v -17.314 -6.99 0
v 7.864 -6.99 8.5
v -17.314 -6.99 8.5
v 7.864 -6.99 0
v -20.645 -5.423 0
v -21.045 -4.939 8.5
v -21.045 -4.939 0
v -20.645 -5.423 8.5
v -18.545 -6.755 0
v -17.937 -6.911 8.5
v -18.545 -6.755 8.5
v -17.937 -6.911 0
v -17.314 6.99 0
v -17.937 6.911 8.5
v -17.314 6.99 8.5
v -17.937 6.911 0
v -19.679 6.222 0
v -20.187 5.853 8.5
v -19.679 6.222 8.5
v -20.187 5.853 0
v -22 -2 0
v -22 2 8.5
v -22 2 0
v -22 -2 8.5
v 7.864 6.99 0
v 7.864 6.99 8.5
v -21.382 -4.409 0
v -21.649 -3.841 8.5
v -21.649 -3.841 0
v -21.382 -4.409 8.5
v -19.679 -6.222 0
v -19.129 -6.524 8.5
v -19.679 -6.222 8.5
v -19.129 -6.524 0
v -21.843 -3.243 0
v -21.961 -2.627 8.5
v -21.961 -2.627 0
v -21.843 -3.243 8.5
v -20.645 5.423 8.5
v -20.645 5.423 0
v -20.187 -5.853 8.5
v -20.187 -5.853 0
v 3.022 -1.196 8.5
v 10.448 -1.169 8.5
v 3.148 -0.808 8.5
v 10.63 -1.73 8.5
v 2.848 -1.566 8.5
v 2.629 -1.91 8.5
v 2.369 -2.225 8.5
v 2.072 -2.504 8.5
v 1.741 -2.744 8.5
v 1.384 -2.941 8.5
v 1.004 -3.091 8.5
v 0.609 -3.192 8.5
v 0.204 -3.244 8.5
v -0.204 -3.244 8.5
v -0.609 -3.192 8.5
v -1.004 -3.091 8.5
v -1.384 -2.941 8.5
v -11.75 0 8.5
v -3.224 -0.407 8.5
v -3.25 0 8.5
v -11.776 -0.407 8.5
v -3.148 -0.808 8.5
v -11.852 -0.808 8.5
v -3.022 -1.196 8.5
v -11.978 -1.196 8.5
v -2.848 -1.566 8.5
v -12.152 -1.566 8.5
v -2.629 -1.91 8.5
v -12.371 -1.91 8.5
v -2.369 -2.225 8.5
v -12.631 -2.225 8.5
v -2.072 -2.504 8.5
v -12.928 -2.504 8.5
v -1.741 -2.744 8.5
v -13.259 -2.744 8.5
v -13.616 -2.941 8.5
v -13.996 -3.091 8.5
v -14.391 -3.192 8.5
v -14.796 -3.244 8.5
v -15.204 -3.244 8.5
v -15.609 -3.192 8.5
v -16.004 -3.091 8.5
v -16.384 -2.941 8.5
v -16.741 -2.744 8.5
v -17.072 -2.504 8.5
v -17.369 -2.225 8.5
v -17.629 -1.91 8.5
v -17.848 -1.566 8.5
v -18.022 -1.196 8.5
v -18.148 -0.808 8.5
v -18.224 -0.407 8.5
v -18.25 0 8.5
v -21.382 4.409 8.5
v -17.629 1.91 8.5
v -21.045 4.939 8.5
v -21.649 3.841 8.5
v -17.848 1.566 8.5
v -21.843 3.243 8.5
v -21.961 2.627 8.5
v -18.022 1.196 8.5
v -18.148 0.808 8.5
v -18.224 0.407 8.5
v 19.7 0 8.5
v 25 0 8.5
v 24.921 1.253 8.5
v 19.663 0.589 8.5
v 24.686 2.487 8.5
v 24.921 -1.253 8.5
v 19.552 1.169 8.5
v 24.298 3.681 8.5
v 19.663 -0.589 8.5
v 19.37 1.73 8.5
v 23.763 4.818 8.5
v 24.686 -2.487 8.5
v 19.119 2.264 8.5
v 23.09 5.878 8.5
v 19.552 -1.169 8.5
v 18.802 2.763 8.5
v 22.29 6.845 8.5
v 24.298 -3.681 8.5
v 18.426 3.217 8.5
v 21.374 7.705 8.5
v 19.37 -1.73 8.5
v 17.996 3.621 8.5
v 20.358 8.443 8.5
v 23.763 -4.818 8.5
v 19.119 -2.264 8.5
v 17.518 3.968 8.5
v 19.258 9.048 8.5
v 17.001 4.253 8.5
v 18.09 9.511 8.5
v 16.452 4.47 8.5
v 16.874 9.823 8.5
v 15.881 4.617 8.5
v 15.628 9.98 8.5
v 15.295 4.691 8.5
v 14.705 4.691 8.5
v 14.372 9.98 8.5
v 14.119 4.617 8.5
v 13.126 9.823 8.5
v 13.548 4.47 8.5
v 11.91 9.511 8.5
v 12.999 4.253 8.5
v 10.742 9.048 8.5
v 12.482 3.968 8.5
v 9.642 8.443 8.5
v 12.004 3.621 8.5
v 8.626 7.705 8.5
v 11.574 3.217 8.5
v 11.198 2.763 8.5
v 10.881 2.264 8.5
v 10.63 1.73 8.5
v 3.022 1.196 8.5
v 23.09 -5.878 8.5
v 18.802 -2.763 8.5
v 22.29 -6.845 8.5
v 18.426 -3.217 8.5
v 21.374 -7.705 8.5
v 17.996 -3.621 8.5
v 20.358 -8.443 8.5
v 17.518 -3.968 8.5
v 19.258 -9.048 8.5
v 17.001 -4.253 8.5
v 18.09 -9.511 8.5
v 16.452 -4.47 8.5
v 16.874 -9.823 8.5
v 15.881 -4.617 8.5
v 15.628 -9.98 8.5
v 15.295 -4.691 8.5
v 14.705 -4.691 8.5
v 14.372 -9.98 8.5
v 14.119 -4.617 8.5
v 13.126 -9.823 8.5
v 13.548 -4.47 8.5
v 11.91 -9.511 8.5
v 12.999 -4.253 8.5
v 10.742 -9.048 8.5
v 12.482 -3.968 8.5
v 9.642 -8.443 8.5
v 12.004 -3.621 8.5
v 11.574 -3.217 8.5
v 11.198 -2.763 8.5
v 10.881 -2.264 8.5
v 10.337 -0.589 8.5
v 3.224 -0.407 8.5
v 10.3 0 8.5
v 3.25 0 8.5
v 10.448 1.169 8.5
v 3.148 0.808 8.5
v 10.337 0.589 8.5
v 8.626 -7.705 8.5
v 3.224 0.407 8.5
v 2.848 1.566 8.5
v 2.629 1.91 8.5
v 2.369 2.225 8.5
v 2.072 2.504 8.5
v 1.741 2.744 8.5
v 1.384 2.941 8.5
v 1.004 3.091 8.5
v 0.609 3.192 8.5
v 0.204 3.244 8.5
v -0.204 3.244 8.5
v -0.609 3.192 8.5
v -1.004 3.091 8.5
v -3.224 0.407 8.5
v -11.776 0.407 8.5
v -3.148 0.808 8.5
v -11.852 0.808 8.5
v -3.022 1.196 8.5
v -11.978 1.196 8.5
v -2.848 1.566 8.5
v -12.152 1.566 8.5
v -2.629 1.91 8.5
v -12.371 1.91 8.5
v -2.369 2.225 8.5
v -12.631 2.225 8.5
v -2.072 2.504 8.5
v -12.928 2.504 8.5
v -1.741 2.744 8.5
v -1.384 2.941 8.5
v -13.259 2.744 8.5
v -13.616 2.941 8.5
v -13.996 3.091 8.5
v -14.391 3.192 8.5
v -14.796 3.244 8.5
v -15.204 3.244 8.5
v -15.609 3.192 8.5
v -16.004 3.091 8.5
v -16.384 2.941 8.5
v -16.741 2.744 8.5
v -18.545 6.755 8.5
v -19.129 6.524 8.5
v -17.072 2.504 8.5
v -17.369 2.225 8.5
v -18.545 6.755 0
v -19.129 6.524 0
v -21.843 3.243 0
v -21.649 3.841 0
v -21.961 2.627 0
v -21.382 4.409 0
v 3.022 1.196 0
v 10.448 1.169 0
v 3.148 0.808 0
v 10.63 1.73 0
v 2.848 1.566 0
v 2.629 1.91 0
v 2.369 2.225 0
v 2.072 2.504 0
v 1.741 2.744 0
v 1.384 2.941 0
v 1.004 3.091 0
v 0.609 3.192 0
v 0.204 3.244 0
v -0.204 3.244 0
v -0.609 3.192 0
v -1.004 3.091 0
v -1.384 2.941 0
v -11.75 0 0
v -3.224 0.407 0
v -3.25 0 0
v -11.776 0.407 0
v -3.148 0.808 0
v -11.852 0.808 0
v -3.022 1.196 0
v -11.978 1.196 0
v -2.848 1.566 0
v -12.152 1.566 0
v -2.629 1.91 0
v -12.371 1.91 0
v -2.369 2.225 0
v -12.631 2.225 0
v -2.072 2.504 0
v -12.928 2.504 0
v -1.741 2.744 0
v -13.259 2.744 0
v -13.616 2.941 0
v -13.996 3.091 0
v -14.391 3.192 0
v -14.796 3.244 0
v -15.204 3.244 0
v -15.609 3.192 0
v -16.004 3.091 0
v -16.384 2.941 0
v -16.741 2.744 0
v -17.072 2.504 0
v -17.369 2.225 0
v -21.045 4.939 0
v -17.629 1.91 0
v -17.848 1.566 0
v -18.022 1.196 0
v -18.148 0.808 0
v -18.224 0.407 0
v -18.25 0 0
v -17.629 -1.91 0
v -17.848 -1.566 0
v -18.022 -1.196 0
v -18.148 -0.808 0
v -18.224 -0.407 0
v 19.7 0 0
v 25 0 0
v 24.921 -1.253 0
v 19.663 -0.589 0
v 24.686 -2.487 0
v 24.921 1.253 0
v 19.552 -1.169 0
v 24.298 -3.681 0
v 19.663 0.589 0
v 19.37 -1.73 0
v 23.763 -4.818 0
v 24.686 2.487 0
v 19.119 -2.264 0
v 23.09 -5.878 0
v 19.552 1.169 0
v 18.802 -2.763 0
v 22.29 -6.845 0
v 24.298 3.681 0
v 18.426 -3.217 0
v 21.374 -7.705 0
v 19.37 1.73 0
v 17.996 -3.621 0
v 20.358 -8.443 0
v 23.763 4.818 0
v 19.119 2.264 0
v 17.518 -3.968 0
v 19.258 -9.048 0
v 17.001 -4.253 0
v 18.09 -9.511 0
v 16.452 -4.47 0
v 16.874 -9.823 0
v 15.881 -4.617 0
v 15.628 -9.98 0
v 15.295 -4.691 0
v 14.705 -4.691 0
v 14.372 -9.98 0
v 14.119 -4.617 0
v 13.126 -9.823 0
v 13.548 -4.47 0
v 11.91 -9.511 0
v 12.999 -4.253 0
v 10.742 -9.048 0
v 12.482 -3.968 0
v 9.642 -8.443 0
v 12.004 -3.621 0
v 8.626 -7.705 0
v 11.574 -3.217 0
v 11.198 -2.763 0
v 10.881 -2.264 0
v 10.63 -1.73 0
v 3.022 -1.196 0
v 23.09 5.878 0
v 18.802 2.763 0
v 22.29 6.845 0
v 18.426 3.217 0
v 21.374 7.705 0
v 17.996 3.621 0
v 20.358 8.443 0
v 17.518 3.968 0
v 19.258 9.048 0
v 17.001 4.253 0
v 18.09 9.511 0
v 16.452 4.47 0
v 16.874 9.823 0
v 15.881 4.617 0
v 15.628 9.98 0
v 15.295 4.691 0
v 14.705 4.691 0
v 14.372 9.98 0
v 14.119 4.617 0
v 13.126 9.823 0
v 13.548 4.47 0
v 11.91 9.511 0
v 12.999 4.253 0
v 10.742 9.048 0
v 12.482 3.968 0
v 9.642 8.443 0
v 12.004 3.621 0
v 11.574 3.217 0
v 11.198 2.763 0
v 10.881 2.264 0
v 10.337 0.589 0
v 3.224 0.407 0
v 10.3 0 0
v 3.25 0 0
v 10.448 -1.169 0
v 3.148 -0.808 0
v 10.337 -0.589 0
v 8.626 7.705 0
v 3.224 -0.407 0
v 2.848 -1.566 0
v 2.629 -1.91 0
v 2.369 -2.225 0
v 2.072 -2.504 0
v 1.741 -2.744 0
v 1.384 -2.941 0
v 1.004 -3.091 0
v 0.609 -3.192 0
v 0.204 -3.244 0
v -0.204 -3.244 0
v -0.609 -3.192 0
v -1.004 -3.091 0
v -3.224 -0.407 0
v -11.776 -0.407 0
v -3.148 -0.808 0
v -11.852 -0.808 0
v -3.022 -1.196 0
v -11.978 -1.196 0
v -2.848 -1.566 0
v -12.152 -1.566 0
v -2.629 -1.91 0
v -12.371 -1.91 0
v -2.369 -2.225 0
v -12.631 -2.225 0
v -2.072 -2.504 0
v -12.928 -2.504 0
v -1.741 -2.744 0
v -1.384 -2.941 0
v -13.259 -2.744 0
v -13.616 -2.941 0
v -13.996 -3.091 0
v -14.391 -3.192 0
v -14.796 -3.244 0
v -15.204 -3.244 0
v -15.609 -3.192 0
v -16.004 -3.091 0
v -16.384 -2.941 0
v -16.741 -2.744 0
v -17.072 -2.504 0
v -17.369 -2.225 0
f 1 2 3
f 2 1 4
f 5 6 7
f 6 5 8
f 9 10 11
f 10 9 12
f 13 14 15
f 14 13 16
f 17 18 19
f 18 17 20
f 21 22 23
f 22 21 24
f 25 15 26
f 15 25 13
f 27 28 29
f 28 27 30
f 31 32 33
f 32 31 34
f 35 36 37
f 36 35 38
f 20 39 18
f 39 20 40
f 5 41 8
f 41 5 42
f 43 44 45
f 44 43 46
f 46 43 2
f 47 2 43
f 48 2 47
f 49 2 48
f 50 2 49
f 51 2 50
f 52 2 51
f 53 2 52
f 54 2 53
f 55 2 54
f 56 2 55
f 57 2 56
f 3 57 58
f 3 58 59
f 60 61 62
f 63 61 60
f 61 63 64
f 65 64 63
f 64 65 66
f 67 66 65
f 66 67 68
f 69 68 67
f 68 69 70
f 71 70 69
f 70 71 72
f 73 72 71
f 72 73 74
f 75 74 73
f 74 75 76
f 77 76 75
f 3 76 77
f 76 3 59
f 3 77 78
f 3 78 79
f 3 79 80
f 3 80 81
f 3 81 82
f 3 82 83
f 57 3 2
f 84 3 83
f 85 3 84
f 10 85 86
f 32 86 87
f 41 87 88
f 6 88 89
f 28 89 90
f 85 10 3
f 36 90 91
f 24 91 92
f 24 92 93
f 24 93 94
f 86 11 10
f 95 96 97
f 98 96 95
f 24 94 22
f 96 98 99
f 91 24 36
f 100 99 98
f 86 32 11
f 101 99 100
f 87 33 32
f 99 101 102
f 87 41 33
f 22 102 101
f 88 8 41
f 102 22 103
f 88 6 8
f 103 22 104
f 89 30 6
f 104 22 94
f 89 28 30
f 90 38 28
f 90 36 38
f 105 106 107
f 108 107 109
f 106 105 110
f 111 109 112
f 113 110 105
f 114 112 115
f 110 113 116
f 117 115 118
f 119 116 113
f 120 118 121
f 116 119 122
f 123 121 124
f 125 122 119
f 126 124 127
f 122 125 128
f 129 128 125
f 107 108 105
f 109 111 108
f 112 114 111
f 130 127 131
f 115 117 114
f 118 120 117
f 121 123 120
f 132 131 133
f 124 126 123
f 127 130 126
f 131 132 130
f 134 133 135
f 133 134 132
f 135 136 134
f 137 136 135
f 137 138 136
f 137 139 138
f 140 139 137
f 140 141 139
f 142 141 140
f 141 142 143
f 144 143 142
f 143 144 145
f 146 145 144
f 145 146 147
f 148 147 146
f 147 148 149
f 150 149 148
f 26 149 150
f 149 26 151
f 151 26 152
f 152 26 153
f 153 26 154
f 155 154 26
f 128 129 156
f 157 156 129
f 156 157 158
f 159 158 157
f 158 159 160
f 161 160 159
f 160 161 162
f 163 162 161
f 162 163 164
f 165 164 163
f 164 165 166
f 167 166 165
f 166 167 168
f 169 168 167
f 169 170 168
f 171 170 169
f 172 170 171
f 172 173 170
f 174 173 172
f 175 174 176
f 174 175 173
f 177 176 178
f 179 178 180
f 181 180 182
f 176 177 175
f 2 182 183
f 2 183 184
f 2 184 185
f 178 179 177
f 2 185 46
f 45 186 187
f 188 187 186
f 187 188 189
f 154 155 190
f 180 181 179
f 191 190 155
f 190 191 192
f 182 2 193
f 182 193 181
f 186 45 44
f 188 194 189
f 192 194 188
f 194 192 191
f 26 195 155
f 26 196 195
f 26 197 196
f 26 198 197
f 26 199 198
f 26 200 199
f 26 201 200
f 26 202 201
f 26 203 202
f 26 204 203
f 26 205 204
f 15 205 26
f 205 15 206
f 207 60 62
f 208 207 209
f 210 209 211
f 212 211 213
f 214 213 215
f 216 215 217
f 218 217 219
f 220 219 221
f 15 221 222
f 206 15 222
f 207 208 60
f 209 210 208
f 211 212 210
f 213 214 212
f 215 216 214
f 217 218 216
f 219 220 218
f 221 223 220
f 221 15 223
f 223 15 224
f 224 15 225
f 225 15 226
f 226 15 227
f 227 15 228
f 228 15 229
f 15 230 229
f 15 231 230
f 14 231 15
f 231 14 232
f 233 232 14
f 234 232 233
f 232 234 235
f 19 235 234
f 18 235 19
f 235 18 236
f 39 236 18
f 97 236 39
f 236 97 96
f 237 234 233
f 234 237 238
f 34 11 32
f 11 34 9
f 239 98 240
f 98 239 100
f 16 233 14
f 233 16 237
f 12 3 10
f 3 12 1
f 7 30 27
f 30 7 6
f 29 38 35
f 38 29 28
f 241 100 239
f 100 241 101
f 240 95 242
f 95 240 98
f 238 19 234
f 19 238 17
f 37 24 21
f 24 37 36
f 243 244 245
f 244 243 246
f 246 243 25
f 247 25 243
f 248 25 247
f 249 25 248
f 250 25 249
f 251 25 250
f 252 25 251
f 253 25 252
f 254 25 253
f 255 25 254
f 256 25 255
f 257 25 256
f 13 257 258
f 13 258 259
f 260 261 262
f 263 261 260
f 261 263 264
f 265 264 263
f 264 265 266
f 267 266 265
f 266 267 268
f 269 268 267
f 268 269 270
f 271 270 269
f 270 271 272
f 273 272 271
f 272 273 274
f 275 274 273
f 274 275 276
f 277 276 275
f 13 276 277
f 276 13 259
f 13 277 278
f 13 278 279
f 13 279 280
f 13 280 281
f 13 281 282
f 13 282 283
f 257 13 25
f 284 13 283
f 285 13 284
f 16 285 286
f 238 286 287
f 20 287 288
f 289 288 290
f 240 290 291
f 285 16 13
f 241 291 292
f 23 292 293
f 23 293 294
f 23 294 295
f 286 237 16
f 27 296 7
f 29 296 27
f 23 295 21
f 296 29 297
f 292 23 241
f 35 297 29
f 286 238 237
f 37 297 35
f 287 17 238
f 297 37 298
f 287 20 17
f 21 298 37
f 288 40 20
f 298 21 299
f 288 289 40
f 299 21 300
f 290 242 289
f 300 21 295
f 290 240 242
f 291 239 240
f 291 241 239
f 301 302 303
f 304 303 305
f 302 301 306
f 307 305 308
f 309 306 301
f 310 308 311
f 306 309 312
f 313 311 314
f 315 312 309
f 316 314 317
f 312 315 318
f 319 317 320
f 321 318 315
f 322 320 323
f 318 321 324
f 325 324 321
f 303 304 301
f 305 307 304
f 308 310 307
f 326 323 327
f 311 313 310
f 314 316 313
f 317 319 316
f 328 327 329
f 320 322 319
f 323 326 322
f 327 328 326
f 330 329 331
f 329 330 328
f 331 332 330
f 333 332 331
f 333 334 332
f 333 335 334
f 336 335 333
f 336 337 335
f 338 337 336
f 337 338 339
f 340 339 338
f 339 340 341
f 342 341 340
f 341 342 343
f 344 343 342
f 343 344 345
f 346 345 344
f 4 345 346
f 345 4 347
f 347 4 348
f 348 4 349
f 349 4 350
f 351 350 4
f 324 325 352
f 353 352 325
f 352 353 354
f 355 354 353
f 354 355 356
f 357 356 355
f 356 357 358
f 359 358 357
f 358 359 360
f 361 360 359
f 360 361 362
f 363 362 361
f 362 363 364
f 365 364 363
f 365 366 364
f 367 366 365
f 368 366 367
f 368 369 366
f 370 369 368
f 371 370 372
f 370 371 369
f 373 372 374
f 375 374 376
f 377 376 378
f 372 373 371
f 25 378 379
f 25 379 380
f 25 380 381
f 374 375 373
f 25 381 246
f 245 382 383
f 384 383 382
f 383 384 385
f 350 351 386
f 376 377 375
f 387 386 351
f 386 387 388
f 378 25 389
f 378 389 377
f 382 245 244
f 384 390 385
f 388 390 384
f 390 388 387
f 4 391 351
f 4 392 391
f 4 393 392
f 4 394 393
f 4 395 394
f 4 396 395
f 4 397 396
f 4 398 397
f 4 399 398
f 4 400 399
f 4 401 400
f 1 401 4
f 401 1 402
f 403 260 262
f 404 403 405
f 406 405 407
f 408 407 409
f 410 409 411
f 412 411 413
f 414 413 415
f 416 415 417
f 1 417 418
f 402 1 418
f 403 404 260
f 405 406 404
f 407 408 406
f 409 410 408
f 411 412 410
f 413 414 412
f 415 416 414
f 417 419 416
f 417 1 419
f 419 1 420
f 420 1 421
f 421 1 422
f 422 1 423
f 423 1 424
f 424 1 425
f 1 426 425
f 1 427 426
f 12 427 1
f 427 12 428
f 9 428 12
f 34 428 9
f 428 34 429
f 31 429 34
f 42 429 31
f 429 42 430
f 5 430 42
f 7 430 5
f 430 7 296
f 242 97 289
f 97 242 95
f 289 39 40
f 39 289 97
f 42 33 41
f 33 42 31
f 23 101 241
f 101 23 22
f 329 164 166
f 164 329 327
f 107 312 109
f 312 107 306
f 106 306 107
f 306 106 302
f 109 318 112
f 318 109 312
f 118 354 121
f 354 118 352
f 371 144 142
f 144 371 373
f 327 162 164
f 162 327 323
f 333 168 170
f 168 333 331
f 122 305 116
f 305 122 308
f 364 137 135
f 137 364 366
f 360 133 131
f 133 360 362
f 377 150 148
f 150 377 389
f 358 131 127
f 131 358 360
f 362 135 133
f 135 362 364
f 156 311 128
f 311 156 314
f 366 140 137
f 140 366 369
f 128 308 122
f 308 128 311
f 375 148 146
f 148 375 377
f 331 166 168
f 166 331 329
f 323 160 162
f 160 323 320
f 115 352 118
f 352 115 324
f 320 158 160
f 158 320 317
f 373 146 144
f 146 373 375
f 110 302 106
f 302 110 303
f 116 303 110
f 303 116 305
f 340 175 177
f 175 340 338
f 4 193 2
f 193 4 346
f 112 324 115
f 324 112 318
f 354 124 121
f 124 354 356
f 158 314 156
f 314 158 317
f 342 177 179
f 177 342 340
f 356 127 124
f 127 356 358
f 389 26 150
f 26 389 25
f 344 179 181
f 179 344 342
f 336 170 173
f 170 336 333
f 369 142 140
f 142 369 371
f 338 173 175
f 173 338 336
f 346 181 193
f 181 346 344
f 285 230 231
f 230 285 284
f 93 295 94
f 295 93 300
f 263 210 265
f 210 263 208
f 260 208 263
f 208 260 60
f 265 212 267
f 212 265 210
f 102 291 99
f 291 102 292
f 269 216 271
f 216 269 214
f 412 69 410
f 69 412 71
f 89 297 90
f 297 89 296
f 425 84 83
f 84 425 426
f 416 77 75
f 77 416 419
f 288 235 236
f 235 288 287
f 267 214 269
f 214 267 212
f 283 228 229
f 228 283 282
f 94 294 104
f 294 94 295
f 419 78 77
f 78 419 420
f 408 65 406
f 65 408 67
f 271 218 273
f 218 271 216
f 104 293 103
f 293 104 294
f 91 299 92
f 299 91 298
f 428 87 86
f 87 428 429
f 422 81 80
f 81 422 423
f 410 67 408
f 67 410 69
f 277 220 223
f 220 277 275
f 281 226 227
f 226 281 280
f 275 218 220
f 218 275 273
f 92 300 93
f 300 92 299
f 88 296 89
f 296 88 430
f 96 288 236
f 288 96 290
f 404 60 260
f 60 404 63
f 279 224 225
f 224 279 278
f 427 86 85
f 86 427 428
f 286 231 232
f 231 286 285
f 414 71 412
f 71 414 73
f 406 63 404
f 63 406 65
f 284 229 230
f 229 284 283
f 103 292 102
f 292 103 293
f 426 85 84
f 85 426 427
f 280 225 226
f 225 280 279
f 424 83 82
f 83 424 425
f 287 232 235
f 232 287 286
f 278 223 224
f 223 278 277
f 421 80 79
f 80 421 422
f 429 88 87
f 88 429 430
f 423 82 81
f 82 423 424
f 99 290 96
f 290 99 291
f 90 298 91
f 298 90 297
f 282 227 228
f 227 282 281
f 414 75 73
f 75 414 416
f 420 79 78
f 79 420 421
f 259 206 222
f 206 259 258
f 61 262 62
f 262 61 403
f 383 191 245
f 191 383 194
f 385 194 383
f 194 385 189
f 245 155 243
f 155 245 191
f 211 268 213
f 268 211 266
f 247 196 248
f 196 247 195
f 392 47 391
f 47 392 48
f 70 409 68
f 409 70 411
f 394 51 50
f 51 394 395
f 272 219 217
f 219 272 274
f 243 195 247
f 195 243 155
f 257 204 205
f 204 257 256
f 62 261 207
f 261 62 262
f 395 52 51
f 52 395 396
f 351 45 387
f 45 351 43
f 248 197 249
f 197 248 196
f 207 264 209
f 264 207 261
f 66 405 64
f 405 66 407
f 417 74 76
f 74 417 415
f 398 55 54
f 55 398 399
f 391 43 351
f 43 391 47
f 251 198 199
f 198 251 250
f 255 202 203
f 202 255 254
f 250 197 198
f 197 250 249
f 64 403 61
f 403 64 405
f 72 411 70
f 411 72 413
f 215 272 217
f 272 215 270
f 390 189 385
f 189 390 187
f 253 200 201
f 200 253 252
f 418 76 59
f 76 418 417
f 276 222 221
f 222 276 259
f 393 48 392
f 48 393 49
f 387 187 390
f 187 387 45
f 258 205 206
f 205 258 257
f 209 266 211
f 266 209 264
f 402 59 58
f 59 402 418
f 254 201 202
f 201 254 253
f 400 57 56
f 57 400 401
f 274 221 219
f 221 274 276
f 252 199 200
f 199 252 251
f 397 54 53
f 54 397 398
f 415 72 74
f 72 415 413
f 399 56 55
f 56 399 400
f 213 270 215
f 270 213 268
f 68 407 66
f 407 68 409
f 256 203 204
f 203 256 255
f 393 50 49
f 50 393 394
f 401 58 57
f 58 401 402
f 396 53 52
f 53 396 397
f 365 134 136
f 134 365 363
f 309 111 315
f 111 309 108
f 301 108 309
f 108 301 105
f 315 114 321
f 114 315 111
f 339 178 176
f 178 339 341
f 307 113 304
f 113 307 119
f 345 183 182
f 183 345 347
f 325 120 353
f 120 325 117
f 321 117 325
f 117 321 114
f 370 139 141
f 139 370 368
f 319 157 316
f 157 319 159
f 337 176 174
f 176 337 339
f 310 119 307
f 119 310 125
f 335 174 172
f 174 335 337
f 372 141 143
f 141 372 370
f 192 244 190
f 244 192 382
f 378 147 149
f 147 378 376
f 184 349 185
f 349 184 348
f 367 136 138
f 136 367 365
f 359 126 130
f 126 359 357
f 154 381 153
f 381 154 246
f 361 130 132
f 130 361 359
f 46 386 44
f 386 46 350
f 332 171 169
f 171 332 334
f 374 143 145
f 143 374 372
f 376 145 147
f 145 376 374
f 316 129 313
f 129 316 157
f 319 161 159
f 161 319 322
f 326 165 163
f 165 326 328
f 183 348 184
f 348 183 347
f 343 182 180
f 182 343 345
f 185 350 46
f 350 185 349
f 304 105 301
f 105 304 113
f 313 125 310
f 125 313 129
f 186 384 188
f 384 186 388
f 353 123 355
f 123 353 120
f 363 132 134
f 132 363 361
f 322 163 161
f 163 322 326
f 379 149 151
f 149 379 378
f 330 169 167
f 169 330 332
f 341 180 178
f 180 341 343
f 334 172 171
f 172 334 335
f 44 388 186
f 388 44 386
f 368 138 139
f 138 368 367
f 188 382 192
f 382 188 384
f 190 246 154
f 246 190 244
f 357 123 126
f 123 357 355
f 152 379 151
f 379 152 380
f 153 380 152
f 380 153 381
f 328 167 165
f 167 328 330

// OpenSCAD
$fn = 50;


difference() {
	union() {
		*color(alpha = 1.0000000000, c = "gray") {
			translate(v = [0, 7, 0]) {
				linear_extrude(height = 1) {
					text(font = "Arial:style=Bold", halign = "center", size = 4.5000000000, text = "COMMENT plate main", valign = "center");
				}
			}
		}
		*color(alpha = 1.0000000000, c = "gray") {
			translate(v = [0, 14, 0]) {
				linear_extrude(height = 1) {
					text(font = "Arial:style=Bold", halign = "center", size = 4.5000000000, text = "COMMENT description oobb_plate_shape_p_type_8.5_depth_3_width_1_height_8.5_thickness_slip_end_extra", valign = "center");
				}
			}
		}
		hull() {
			translate(v = [-17.0000000000, 2.0000000000, 0]) {
				cylinder(h = 8.5000000000, r = 5);
			}
			translate(v = [17.0000000000, 2.0000000000, 0]) {
				cylinder(h = 8.5000000000, r = 5);
			}
			translate(v = [-17.0000000000, -2.0000000000, 0]) {
				cylinder(h = 8.5000000000, r = 5);
			}
			translate(v = [17.0000000000, -2.0000000000, 0]) {
				cylinder(h = 8.5000000000, r = 5);
			}
		}
		translate(v = [15.0000000000, 0, 0.0000000000]) {
			cylinder(h = 8.5000000000, r = 10.0000000000);
		}
	}
	union() {
		*color(alpha = 1.0000000000, c = "gray") {
			translate(v = [0, 7, 0]) {
				linear_extrude(height = 1) {
					text(font = "Arial:style=Bold", halign = "center", size = 4.5000000000, text = "COMMENT holes main", valign = "center");
				}
			}
		}
		*color(alpha = 1.0000000000, c = "gray") {
			translate(v = [0, 14, 0]) {
				linear_extrude(height = 1) {
					text(font = "Arial:style=Bold", halign = "center", size = 4.5000000000, text = "COMMENT description oobb_holes_shape_n_type_3_width_1_height_8.5_thickness_slip_end_extra_false_both_holes", valign = "center");
				}
			}
		}
		translate(v = [-15.0000000000, 0.0000000000, 0]) {
			translate(v = [0, 0, -50]) {
				cylinder(h = 100, r = 3.2500000000);
			}
		}
		translate(v = [0, 0, -50]) {
			cylinder(h = 100, r = 3.2500000000);
		}
		translate(v = [15.0000000000, 0.0000000000, 0]) {
			translate(v = [0, 0, -50]) {
				cylinder(h = 100, r = 3.2500000000);
			}
		}
		*color(alpha = 1.0000000000, c = "gray") {
			translate(v = [0, 7, 0]) {
				linear_extrude(height = 1) {
					text(font = "Arial:style=Bold", halign = "center", size = 4.5000000000, text = "COMMENT slip_end", valign = "center");
				}
			}
		}
		translate(v = [15.0000000000, 0, -50.0000000000]) {
			cylinder(h = 100, r = 4.7000000000);
		}
	}
}
